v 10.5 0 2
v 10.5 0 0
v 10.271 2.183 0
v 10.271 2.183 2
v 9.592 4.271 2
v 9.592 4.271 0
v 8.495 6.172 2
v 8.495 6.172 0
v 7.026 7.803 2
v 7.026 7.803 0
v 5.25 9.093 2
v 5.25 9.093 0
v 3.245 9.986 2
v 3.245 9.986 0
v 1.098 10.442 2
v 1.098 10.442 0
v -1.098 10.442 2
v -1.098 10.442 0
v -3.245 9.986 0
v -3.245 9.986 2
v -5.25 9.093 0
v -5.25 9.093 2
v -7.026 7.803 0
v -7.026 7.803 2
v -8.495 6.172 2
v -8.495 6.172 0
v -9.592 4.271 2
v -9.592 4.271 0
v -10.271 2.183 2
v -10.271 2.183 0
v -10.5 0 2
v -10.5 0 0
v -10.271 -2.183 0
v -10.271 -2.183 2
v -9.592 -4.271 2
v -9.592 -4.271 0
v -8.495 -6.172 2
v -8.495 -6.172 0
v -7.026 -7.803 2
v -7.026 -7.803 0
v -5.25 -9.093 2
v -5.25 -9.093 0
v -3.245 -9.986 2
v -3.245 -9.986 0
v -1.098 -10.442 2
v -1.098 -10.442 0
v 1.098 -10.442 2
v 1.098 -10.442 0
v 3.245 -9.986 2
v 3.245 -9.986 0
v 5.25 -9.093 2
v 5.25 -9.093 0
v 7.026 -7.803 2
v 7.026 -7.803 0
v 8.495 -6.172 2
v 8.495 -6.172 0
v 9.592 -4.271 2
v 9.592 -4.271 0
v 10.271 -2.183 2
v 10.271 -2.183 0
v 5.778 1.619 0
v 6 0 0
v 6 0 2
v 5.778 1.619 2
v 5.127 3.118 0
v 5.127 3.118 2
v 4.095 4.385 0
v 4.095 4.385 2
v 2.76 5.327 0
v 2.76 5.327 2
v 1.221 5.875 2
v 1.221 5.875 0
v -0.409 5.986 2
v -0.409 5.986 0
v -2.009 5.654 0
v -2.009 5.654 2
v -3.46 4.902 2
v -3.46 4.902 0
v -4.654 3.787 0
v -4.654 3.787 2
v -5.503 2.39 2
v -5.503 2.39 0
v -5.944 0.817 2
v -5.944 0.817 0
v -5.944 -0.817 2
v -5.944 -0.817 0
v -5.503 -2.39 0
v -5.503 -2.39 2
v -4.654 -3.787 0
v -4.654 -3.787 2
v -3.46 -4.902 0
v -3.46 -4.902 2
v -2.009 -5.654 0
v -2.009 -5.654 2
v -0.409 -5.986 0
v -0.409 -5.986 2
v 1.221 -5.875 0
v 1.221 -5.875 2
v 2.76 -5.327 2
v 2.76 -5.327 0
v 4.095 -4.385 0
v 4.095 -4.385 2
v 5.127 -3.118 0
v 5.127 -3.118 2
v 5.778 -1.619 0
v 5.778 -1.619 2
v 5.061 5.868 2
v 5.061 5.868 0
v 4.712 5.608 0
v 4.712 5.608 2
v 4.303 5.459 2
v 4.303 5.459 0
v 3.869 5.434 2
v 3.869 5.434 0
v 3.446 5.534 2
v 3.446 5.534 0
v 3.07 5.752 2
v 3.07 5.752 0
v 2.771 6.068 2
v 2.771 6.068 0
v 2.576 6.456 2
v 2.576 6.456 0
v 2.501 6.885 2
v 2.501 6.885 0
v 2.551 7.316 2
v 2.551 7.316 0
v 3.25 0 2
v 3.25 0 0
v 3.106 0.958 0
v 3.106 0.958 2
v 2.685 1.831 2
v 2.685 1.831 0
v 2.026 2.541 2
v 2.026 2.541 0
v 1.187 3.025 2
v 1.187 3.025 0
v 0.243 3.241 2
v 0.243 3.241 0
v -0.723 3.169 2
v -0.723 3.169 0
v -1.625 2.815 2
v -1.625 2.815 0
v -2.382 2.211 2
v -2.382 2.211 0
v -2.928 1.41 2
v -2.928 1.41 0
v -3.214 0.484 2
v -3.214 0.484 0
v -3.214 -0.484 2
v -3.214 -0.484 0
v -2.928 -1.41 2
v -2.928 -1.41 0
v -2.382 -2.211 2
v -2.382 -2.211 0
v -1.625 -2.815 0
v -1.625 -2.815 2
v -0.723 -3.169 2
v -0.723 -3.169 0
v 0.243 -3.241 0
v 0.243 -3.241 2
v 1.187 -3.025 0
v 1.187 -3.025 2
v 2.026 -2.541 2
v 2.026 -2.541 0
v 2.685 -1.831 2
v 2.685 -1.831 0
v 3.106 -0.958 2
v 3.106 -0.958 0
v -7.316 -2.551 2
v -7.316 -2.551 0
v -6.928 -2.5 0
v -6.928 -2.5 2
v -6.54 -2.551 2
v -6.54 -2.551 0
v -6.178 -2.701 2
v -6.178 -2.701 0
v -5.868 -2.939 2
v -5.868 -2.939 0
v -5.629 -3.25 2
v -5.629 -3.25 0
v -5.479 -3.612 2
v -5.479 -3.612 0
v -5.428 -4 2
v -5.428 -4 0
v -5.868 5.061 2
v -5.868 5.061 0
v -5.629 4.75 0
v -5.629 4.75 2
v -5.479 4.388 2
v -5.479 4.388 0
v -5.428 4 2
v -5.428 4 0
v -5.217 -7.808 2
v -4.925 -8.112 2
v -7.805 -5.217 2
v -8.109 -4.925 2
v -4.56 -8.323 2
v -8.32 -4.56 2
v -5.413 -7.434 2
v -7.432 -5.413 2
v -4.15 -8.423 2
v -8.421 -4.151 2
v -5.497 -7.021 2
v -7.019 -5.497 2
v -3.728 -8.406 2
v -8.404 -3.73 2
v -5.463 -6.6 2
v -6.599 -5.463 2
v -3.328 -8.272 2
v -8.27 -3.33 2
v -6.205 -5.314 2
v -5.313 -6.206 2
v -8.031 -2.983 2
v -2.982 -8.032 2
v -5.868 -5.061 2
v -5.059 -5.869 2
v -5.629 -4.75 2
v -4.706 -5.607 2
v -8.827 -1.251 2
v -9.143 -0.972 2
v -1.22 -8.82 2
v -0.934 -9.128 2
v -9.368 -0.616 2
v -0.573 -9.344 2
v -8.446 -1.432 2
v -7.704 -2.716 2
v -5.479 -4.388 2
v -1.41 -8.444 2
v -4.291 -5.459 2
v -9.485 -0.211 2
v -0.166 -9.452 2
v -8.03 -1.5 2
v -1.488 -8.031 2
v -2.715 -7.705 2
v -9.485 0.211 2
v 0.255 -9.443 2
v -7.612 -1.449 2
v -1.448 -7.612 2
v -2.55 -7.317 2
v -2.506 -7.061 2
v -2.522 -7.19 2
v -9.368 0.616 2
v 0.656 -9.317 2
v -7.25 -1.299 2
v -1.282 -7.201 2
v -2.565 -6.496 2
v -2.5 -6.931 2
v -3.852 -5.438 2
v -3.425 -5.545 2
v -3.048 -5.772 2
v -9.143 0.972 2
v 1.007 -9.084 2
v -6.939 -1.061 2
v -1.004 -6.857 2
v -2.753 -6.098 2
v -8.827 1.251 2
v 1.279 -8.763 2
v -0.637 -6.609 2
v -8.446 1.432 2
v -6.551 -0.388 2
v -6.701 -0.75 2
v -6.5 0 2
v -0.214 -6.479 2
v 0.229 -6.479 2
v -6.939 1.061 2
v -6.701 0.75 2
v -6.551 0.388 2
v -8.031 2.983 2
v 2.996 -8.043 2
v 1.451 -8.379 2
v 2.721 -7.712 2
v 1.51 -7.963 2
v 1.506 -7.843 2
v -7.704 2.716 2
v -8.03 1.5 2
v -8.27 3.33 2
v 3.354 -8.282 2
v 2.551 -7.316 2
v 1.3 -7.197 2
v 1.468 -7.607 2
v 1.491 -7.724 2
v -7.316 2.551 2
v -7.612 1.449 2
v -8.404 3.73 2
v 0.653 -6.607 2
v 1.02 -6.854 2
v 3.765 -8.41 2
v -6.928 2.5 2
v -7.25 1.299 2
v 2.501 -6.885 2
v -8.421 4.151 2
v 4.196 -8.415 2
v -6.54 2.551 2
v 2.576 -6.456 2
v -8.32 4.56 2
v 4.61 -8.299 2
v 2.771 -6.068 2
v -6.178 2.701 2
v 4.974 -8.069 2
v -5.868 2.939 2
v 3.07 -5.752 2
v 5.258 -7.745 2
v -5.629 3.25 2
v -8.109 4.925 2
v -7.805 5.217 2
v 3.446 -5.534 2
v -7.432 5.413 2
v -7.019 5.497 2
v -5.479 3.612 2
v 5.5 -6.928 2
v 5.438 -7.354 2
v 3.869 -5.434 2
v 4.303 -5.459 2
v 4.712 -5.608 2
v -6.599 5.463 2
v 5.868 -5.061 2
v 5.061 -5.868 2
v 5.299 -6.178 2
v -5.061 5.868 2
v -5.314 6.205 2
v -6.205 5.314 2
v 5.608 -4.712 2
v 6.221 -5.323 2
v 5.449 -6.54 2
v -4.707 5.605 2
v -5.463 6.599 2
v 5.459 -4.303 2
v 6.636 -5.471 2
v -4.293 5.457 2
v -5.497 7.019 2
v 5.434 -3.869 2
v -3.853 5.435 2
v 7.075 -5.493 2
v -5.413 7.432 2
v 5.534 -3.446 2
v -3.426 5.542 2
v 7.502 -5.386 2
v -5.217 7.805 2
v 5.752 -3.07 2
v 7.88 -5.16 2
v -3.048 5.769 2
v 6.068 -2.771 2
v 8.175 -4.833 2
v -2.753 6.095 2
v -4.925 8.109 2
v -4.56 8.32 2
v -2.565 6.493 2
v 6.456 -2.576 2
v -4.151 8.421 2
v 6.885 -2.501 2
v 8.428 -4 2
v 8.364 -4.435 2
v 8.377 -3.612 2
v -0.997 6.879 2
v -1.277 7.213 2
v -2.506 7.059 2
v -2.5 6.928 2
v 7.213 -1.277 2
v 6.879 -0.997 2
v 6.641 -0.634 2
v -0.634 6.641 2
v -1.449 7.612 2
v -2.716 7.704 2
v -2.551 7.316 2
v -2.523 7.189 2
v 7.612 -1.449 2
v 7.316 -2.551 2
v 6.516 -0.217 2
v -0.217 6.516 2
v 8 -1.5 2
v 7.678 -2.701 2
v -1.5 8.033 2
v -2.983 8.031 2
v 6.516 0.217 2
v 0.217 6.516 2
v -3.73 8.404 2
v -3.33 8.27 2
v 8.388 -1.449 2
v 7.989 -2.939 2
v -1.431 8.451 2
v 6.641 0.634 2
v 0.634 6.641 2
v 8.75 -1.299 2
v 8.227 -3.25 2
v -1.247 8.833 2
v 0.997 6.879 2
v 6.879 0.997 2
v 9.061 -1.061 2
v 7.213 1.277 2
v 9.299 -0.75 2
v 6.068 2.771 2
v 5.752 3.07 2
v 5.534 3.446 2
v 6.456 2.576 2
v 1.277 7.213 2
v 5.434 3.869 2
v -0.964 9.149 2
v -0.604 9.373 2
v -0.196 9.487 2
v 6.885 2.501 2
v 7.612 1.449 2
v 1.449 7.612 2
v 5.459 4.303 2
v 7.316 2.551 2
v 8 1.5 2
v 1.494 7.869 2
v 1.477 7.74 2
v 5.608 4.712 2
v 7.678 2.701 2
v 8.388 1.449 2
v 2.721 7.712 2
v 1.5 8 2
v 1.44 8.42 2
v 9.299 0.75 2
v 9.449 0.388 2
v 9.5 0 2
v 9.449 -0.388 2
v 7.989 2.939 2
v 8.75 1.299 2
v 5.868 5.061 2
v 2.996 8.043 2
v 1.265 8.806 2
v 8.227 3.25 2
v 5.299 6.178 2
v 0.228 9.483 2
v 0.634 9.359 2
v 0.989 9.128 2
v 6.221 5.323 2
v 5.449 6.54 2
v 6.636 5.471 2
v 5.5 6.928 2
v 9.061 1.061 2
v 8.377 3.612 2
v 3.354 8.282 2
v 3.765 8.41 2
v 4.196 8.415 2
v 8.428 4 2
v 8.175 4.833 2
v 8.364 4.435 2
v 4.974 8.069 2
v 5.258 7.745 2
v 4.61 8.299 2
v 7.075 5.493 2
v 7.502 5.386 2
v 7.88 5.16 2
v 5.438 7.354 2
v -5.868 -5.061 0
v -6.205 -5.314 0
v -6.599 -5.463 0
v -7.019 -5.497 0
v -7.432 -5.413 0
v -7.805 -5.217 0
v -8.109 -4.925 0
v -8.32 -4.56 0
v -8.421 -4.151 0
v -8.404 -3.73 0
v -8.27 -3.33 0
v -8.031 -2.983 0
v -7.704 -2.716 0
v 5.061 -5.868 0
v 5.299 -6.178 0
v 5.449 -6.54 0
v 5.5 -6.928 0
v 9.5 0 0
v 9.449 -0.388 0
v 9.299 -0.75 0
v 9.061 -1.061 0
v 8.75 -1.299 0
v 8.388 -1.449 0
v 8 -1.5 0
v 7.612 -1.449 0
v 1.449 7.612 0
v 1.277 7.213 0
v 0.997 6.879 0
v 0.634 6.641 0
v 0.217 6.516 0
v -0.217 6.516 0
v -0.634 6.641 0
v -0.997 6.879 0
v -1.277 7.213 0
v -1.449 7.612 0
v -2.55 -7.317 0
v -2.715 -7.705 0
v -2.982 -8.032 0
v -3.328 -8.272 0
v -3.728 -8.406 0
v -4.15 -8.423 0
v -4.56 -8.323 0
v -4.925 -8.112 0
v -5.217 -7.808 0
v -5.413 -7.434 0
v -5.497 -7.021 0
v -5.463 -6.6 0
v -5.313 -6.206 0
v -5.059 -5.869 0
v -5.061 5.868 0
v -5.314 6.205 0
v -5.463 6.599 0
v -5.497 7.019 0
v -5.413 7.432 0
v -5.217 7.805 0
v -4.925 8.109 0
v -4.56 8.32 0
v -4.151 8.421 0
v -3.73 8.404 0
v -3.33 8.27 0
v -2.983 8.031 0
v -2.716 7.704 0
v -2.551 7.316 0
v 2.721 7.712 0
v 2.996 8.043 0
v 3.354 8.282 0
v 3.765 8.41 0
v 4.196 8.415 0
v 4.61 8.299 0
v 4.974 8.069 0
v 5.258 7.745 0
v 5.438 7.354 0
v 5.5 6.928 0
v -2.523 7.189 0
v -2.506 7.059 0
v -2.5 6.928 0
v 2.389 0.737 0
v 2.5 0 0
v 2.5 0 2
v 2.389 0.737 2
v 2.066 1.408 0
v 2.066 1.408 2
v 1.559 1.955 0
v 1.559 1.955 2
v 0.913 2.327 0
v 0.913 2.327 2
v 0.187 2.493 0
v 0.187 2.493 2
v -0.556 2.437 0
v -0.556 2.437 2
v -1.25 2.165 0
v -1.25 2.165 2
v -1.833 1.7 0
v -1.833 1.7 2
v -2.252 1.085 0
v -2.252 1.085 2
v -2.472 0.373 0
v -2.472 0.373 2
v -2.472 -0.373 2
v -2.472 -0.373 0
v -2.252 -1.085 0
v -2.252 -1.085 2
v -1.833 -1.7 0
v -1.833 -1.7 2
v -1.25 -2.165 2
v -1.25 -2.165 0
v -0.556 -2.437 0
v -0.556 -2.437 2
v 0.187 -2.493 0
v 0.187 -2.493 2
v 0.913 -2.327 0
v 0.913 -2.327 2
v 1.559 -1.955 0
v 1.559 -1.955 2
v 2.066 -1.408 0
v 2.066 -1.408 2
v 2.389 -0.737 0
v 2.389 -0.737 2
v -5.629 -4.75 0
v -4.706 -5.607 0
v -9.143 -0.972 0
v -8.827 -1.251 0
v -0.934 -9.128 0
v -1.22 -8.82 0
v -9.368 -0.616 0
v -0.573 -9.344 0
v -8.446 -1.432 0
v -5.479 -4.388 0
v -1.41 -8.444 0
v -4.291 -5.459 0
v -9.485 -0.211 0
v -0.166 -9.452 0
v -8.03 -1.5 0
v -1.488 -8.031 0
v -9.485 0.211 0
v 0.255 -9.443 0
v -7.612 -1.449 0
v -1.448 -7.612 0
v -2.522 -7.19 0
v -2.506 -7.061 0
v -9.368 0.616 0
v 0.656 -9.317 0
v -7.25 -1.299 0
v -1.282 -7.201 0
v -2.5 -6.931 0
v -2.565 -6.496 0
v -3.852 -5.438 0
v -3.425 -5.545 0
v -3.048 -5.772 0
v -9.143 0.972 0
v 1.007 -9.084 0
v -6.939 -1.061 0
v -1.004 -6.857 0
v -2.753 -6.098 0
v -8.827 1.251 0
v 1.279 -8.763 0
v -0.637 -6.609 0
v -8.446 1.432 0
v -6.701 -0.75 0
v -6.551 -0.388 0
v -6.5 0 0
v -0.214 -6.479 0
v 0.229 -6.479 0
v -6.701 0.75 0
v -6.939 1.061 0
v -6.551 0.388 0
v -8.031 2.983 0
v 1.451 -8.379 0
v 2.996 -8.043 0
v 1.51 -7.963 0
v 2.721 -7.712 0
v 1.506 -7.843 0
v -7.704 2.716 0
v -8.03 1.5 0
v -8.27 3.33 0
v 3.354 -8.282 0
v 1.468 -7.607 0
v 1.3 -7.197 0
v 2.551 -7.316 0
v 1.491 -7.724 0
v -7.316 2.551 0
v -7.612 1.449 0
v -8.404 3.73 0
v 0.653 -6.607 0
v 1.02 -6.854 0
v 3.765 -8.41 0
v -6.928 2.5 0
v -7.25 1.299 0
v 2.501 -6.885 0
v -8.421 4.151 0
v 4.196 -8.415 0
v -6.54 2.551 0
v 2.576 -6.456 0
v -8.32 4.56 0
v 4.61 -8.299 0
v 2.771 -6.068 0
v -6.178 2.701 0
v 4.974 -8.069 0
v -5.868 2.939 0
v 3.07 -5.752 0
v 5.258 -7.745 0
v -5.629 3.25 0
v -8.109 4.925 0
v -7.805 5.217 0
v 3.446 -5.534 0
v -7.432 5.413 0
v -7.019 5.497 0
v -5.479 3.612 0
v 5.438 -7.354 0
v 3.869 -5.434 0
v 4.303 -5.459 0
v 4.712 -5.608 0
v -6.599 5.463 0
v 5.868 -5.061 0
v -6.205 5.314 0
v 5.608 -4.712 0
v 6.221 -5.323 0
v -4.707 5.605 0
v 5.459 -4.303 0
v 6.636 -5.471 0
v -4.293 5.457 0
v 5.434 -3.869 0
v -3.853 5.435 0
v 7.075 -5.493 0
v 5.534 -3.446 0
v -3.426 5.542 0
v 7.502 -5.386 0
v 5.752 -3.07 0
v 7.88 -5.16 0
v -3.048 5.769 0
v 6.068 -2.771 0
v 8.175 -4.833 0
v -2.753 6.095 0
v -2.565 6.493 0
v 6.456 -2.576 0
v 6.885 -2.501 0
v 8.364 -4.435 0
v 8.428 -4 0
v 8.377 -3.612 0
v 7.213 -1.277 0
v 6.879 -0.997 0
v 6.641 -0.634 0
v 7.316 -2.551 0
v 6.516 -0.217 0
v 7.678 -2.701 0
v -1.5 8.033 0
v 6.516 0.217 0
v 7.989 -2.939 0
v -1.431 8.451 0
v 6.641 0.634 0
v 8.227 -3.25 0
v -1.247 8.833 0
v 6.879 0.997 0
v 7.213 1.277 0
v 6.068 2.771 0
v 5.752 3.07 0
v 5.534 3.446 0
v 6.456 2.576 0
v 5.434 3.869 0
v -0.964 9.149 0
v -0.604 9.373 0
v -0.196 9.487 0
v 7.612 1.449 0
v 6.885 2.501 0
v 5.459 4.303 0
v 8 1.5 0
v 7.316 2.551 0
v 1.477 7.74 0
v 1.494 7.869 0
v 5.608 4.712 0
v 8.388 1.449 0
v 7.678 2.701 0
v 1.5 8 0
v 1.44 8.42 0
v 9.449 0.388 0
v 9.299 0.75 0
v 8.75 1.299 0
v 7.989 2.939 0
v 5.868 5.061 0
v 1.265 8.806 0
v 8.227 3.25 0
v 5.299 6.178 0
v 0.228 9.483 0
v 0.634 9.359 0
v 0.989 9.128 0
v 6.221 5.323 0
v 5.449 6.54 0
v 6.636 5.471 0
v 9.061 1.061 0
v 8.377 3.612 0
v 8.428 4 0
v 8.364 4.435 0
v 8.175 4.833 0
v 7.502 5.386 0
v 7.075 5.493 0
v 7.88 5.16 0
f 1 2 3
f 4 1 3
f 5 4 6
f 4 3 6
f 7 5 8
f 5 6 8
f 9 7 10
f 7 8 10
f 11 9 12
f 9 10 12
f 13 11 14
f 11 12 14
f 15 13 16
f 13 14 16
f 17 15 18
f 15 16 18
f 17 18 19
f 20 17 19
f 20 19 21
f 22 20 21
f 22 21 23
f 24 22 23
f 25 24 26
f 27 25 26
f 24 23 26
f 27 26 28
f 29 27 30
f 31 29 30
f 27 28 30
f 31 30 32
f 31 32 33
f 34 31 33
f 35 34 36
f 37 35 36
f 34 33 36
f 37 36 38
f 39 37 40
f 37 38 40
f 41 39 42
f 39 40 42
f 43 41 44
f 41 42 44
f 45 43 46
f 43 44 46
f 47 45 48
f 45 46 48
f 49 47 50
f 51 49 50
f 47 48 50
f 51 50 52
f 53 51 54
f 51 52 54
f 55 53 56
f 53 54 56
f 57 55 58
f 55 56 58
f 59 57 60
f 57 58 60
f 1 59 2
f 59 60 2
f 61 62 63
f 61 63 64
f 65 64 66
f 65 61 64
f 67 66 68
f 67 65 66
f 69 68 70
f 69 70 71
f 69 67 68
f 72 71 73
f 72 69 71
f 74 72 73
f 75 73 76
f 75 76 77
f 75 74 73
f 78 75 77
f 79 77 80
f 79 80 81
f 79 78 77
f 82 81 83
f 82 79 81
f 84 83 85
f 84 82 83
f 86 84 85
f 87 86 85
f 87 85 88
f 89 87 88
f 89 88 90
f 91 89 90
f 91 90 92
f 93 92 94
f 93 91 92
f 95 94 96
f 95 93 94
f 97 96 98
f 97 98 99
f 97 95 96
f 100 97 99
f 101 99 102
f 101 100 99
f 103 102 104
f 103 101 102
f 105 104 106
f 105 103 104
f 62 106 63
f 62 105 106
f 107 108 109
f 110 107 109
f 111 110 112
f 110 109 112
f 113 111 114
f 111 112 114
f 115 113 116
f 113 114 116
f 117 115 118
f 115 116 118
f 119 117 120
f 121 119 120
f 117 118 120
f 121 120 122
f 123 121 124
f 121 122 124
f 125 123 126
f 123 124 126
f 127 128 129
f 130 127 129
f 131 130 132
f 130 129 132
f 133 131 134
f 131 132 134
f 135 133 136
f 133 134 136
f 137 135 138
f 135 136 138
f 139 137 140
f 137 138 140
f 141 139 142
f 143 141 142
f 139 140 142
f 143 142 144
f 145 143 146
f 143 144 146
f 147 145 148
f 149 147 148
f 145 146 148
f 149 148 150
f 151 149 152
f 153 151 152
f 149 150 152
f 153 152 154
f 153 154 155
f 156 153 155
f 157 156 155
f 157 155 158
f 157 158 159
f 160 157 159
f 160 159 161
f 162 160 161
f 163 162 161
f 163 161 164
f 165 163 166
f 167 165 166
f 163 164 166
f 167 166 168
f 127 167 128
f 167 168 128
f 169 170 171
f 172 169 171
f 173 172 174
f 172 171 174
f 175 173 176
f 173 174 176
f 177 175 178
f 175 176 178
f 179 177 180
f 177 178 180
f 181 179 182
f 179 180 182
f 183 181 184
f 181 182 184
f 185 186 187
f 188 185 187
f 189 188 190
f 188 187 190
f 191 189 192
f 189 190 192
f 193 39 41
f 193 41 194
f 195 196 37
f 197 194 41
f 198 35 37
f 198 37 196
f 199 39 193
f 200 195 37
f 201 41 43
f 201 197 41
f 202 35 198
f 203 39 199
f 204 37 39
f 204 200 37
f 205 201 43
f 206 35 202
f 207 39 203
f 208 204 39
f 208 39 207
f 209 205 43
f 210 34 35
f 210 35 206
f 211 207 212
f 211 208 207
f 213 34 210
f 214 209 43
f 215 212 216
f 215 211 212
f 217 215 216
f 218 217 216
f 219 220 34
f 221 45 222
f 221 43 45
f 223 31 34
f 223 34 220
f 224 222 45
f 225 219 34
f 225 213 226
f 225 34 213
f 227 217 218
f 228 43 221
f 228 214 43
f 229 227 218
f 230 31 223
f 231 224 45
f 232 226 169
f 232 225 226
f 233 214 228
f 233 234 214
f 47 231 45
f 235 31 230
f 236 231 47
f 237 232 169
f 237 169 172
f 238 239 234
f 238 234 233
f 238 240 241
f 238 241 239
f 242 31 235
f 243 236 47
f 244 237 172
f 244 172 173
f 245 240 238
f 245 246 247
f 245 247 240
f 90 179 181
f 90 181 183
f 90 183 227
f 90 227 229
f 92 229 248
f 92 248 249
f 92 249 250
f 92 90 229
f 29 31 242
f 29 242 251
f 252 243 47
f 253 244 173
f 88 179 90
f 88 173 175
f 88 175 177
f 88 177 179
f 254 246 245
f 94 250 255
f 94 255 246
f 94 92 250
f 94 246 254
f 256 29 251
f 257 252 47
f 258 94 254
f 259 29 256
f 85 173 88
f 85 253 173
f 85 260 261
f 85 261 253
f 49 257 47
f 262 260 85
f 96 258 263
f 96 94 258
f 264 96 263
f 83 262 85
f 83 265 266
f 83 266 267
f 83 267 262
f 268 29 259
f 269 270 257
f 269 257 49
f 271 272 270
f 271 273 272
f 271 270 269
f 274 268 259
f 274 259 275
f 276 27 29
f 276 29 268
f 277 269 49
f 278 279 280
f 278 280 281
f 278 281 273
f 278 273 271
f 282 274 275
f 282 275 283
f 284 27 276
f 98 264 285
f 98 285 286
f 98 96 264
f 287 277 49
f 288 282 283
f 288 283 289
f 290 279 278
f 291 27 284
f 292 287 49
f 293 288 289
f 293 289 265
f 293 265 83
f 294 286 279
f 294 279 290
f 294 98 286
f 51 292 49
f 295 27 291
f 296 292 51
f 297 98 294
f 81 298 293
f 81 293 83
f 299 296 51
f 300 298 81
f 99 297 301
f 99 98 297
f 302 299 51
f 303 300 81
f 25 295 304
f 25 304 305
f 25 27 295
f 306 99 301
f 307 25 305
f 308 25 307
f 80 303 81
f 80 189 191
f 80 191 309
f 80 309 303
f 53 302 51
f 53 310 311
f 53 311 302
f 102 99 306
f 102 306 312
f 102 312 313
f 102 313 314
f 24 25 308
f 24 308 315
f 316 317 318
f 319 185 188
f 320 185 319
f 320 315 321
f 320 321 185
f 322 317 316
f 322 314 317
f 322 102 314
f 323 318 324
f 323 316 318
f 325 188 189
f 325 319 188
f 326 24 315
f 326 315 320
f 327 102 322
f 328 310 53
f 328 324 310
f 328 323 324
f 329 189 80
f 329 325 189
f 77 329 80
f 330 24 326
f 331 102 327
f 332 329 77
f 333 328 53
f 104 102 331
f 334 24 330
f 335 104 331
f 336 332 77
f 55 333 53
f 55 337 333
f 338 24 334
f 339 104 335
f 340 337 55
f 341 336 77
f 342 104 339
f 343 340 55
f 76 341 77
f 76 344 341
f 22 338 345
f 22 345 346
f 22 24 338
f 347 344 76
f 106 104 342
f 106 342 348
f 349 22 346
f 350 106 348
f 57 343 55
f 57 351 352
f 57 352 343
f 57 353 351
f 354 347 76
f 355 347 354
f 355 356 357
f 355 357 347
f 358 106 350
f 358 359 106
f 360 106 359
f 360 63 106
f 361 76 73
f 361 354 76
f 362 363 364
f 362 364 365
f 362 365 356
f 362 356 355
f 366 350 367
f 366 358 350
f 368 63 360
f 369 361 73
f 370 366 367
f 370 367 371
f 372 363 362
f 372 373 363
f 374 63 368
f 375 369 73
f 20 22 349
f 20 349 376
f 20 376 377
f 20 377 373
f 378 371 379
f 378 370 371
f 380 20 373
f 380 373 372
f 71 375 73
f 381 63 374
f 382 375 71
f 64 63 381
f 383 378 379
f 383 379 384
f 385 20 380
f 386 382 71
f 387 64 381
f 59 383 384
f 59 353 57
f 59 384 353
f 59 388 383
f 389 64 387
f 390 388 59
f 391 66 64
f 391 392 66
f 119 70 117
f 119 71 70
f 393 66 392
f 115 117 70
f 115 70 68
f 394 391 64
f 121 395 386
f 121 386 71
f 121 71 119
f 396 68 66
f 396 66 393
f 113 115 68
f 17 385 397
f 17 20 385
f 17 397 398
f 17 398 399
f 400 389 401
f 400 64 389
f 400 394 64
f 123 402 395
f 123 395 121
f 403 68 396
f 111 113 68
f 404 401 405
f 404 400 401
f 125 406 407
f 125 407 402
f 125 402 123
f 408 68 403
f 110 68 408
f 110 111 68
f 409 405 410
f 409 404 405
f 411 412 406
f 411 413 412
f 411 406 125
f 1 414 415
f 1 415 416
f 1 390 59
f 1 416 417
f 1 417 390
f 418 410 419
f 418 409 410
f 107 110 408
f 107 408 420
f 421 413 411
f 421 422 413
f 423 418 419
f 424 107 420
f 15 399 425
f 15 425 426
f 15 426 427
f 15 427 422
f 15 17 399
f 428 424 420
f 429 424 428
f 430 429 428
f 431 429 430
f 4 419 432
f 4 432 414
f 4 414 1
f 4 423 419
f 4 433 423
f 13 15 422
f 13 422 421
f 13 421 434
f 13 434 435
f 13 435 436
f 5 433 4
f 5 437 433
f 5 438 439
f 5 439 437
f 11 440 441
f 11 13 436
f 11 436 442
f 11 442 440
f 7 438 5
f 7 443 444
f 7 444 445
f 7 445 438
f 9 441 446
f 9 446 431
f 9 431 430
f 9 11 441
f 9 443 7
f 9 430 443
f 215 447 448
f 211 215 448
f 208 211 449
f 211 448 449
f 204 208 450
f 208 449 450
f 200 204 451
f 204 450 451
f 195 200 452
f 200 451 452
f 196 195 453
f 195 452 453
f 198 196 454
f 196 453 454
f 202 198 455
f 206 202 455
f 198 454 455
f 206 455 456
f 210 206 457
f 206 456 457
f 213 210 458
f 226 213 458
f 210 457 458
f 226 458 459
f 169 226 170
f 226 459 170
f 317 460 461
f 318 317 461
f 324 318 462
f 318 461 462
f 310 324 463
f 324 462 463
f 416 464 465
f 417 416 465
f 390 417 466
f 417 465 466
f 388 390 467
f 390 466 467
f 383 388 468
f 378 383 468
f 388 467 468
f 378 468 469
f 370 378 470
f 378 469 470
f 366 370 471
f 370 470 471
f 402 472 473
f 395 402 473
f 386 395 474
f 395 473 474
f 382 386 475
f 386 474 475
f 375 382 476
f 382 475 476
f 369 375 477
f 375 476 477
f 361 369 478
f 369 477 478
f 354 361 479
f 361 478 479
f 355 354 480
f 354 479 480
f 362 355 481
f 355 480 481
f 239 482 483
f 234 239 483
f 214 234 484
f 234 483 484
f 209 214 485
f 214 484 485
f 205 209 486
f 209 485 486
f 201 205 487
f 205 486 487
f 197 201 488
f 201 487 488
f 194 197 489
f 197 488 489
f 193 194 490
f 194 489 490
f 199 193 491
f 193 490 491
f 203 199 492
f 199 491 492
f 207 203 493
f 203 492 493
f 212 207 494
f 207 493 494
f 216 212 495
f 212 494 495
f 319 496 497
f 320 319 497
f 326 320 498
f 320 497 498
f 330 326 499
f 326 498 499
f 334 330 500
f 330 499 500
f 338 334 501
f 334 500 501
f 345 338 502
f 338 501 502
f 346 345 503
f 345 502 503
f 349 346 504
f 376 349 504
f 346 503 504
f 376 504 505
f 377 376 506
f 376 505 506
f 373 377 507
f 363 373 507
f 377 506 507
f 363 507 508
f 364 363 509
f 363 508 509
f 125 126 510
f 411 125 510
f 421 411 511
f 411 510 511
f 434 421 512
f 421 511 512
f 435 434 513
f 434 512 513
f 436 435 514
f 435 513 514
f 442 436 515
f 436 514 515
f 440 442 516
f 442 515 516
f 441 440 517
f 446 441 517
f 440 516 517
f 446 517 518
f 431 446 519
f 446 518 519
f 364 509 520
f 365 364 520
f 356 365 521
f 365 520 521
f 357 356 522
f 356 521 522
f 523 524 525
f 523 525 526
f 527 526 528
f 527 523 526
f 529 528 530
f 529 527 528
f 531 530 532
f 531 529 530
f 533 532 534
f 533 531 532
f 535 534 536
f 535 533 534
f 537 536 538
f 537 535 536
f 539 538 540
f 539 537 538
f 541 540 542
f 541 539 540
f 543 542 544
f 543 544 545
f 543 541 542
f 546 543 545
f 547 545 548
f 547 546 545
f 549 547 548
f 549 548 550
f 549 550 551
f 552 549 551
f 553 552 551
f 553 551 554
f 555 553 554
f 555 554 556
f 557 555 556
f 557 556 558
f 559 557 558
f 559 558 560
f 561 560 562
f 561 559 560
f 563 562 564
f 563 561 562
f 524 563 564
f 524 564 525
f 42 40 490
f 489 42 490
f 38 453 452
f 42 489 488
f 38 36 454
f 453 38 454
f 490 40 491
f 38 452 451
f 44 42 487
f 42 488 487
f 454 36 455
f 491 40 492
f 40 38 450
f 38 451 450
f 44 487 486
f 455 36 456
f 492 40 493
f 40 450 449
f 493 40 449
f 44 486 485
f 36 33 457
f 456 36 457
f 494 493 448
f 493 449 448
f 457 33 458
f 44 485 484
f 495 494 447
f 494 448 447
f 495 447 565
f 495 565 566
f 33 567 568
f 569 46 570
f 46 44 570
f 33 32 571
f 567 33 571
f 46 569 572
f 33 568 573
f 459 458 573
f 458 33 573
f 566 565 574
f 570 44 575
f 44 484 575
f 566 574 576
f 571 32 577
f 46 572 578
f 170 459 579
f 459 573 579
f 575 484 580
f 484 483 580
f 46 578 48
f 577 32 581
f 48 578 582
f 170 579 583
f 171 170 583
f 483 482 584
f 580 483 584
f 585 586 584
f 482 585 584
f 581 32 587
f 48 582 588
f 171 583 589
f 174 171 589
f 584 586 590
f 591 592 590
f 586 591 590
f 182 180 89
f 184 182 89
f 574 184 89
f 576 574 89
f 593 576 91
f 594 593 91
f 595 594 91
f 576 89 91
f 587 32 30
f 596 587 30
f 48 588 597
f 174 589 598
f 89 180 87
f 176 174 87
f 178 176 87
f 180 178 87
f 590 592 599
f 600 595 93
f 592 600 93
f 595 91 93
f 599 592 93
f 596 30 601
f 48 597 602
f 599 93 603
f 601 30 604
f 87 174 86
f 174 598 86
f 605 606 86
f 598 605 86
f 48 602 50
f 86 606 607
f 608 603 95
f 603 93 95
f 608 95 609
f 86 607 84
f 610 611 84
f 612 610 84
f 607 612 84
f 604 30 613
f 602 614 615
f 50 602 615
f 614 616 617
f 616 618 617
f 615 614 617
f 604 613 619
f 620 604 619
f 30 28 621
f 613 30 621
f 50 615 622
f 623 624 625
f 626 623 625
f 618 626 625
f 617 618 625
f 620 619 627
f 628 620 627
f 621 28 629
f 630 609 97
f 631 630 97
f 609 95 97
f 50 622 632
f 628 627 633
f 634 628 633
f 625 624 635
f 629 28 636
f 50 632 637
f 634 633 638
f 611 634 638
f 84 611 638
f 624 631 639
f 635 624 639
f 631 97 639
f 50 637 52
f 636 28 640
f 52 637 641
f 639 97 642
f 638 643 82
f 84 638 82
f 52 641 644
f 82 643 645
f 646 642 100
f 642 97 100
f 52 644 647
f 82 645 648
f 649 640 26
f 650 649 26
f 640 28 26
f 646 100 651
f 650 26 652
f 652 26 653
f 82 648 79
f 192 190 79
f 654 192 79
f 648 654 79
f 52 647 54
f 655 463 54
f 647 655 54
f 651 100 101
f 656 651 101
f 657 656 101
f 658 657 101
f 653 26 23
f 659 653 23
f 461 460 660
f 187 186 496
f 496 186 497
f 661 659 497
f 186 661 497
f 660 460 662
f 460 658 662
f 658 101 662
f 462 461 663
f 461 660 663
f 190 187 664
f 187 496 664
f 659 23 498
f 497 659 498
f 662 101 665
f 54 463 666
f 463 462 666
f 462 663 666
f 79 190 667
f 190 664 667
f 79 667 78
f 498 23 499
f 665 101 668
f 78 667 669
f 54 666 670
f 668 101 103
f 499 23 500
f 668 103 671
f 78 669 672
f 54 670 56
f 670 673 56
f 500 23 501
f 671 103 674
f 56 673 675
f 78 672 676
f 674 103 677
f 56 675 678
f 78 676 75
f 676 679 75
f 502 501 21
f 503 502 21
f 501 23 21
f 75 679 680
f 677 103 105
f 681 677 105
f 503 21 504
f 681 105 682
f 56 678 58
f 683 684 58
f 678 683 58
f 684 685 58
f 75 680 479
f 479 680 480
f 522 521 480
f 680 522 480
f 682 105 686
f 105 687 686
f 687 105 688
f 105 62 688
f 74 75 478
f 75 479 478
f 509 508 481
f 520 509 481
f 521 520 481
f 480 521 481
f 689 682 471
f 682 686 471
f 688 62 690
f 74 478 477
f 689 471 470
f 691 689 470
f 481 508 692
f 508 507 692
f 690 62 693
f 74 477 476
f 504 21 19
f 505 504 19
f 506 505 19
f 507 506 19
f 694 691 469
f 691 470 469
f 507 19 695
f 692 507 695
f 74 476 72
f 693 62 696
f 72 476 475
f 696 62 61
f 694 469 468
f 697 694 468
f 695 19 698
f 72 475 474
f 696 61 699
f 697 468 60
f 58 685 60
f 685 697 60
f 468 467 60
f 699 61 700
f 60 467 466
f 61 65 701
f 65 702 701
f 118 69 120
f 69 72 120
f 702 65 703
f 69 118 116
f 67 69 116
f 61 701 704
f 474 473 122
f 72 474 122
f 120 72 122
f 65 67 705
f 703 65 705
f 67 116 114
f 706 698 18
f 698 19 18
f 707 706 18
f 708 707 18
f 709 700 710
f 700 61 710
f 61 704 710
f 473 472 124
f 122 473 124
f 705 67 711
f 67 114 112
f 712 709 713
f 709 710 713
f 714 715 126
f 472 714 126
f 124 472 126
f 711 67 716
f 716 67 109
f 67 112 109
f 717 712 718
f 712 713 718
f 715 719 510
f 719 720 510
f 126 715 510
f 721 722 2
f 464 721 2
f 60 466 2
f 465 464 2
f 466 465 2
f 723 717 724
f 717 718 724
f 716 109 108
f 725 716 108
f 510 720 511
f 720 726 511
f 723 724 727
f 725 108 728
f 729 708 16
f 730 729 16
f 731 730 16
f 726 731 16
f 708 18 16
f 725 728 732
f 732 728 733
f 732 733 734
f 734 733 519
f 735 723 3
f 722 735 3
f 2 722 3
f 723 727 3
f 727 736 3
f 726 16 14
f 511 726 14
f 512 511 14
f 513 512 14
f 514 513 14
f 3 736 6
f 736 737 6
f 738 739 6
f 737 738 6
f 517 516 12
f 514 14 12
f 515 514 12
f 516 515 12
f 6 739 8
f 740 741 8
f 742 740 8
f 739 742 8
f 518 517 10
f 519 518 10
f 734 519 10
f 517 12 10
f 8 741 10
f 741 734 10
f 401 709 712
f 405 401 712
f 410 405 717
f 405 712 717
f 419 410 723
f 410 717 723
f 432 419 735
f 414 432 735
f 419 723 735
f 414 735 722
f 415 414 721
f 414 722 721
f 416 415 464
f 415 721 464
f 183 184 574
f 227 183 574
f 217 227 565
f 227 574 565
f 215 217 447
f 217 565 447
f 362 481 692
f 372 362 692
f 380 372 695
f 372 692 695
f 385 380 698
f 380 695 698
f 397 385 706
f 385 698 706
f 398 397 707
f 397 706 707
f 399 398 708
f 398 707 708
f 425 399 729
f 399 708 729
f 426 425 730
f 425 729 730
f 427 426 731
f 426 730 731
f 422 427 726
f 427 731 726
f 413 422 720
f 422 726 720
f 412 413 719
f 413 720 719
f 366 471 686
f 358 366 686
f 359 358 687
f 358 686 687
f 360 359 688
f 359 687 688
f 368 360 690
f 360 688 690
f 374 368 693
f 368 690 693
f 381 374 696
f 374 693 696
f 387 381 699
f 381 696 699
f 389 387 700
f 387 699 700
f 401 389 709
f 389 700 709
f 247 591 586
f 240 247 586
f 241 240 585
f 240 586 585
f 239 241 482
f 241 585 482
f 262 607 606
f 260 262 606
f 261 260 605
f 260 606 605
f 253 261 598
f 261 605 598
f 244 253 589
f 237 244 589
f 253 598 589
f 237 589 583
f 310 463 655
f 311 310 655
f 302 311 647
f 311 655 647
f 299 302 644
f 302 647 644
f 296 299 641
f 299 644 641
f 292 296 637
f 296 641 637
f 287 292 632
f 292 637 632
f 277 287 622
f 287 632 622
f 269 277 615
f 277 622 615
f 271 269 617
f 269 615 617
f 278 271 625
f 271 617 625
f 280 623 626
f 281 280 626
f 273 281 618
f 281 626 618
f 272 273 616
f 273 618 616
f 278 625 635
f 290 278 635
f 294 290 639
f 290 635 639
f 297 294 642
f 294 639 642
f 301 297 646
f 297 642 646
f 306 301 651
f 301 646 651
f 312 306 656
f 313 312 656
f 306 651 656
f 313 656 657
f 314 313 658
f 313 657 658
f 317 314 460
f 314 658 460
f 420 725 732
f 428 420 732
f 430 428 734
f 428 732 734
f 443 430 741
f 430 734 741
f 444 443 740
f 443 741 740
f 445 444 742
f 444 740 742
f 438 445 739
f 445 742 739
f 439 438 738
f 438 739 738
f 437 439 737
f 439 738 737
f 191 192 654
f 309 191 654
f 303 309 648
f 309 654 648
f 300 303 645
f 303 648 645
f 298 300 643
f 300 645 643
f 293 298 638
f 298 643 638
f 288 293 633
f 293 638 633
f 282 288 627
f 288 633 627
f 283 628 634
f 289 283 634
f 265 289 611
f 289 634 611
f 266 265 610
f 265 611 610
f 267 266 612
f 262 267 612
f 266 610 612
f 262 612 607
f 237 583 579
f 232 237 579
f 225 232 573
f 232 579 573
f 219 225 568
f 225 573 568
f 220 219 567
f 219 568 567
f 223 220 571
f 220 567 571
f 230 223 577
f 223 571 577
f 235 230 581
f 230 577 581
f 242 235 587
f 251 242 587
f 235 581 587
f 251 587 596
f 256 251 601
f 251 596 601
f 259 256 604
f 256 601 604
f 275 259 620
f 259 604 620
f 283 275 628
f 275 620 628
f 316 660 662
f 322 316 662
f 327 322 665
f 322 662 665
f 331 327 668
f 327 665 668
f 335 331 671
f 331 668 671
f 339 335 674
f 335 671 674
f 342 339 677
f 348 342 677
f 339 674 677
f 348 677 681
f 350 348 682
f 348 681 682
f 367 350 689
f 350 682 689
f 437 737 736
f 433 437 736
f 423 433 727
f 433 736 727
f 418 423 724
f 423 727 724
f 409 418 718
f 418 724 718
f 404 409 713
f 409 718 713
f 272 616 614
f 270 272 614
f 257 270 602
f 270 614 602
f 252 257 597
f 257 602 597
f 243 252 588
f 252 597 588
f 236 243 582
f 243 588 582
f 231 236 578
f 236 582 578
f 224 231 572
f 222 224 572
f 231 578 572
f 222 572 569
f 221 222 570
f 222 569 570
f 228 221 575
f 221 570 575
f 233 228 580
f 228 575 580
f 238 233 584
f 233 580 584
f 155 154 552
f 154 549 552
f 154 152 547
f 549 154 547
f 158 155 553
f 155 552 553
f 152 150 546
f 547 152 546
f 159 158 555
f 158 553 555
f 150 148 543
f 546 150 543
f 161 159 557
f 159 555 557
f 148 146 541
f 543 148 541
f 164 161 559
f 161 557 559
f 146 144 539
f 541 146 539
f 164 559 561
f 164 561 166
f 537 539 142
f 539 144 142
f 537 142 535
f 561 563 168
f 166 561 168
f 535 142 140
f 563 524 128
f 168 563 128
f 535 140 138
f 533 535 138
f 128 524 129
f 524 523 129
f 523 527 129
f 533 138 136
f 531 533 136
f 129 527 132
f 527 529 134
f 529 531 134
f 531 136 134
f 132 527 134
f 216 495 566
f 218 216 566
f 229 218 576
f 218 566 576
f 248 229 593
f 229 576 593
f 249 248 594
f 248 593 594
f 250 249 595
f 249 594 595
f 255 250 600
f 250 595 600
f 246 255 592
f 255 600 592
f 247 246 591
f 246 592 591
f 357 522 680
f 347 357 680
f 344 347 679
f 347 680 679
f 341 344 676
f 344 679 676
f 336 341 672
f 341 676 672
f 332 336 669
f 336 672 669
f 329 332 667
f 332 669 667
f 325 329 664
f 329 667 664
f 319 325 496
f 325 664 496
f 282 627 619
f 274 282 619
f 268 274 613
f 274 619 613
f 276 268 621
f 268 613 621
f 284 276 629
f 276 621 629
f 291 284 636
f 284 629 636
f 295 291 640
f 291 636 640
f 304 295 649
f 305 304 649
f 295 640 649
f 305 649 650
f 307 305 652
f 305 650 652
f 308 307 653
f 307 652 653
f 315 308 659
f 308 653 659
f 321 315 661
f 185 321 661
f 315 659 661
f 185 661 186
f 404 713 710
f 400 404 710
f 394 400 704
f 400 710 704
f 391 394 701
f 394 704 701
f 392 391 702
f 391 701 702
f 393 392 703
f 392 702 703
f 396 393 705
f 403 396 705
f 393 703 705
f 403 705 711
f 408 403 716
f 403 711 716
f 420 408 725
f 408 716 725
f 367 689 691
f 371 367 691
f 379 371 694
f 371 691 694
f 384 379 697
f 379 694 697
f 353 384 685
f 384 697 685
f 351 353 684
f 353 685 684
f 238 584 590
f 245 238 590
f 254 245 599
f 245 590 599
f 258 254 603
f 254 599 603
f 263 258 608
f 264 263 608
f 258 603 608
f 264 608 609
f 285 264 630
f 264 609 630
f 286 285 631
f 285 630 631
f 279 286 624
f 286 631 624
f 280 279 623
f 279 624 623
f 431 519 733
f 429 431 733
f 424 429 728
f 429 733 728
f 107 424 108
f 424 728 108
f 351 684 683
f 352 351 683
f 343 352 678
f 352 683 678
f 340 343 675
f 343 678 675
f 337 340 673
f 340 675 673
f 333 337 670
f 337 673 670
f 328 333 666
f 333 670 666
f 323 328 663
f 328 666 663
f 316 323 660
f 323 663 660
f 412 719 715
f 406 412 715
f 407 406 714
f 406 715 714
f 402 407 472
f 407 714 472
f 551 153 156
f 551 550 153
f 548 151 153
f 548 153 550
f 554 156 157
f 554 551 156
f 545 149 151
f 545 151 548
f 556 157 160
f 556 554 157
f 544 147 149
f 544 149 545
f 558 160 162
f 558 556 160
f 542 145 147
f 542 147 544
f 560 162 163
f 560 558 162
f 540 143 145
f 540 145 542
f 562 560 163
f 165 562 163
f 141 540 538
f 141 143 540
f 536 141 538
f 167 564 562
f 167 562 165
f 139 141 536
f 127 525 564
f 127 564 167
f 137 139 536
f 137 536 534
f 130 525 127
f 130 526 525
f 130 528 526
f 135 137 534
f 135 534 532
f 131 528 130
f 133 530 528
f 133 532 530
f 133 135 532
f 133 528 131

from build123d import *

# Parameters (mm, degrees)
F0_R     = 10.5
F0_R_2   = 6
F1_DEPTH = 2
F0_R_3   = 3.25
F0_R_4   = 2.5


# Not quite as in the source:
# - the program builds the solid bodies; features that only make, move or delete a surface that nothing else refers to are left out


with BuildPart() as f1:
    # F0 (on Top) → F1 (new body)
    with BuildSketch(Plane.XY):
        Circle(F0_R)
        with BuildLine():
            ThreePointArc((-5.0606601718, 5.8675430585), (-4.75, 8.227241336), (-2.5511112606, 7.3164317979))
            Line((-2.5511112606, 7.3164317979), (-1.4488887394, 7.6117714323))
            ThreePointArc((-1.4488887394, 7.6117714323), (-0.1957892883, 9.4871672921), (1.5, 8))
            ThreePointArc((1.5, 8), (1.4871672921, 7.8042107117), (1.4488887394, 7.6117714323))
            Line((1.4488887394, 7.6117714323), (2.5511112606, 7.3164317979))
            ThreePointArc((2.5511112606, 7.3164317979), (4.1957892883, 8.4153705223), (5.5, 6.9282032303))
            ThreePointArc((5.5, 6.9282032303), (5.3858192988, 6.3541780817), (5.0606601718, 5.8675430585))
            Line((5.0606601718, 5.8675430585), (5.8675430585, 5.0606601718))
            ThreePointArc((5.8675430585, 5.0606601718), (7.5022283788, 5.3858192988), (8.4282032303, 4))
            ThreePointArc((8.4282032303, 4), (8.1182332407, 3.0868578565), (7.3164317979, 2.5511112606))
            Line((7.3164317979, 2.5511112606), (7.6117714323, 1.4488887394))
            ThreePointArc((7.6117714323, 1.4488887394), (8.9131421435, 1.1900300104), (9.5, 0))
            ThreePointArc((9.5, 0), (8.9131421435, -1.1900300104), (7.6117714323, -1.4488887394))
            Line((7.6117714323, -1.4488887394), (7.3164317979, -2.5511112606))
            ThreePointArc((7.3164317979, -2.5511112606), (8.1182332407, -3.0868578565), (8.4282032303, -4))
            ThreePointArc((8.4282032303, -4), (7.5022283788, -5.3858192988), (5.8675430585, -5.0606601718))
            Line((5.8675430585, -5.0606601718), (5.0606601718, -5.8675430585))
            ThreePointArc((5.0606601718, -5.8675430585), (5.3858192988, -6.3541780817), (5.5, -6.9282032303))
            ThreePointArc((5.5, -6.9282032303), (4.1957892883, -8.4153705223), (2.5511112606, -7.3164317979))
            Line((2.5511112606, -7.3164317979), (1.4675350544, -7.6067751673))
            ThreePointArc((1.4675350544, -7.6067751673), (1.4996006084, -7.7833853166), (1.51034039, -7.9625612125))
            ThreePointArc((1.51034039, -7.9625612125), (-0.16617732, -9.4521388365), (-1.4481149408, -7.6119787711))
            Line((-1.4481149408, -7.6119787711), (-2.5504401106, -7.316611632))
            ThreePointArc((-2.5504401106, -7.316611632), (-4.7496981342, -8.2301088879), (-5.0593126587, -5.8688905716))
            Line((-5.0593126587, -5.8688905716), (-5.8675430585, -5.0606601718))
            ThreePointArc((-5.8675430585, -5.0606601718), (-8.227241336, -4.75), (-7.3164317979, -2.5511112606))
            Line((-7.3164317979, -2.5511112606), (-7.6117714323, -1.4488887394))
            ThreePointArc((-7.6117714323, -1.4488887394), (-9.5, 0), (-7.6117714323, 1.4488887394))
            Line((-7.6117714323, 1.4488887394), (-7.3164317979, 2.5511112606))
            ThreePointArc((-7.3164317979, 2.5511112606), (-8.227241336, 4.75), (-5.8675430585, 5.0606601718))
            Line((-5.8675430585, 5.0606601718), (-5.0606601718, 5.8675430585))
        make_face(mode=Mode.SUBTRACT)
        with BuildLine():
            ThreePointArc((-2.5511112606, 7.3164317979), (-2.5128327079, 7.1239925186), (-2.5, 6.9282032303))
            ThreePointArc((-2.5, 6.9282032303), (-3.4259748515, 5.5423839315), (-5.0606601718, 5.8675430585))
            Line((-5.0606601718, 5.8675430585), (-5.8675430585, 5.0606601718))
            ThreePointArc((-5.8675430585, 5.0606601718), (-5.5423839315, 4.5740251485), (-5.4282032303, 4))
            ThreePointArc((-5.4282032303, 4), (-6.0150610868, 2.8099699896), (-7.3164317979, 2.5511112606))
            Line((-7.3164317979, 2.5511112606), (-7.6117714323, 1.4488887394))
            ThreePointArc((-7.6117714323, 1.4488887394), (-6.8099699896, 0.9131421435), (-6.5, 0))
            ThreePointArc((-6.5, 0), (-6.8099699896, -0.9131421435), (-7.6117714323, -1.4488887394))
            Line((-7.6117714323, -1.4488887394), (-7.3164317979, -2.5511112606))
            ThreePointArc((-7.3164317979, -2.5511112606), (-6.0150610868, -2.8099699896), (-5.4282032303, -4))
            ThreePointArc((-5.4282032303, -4), (-5.5423839315, -4.5740251485), (-5.8675430585, -5.0606601718))
            Line((-5.8675430585, -5.0606601718), (-5.0593126587, -5.8688905716))
            ThreePointArc((-5.0593126587, -5.8688905716), (-3.4250952201, -5.5454419303), (-2.5, -6.9308965467))
            ThreePointArc((-2.5, -6.9308965467), (-2.5126634822, -7.1253961173), (-2.5504401106, -7.316611632))
            Line((-2.5504401106, -7.316611632), (-1.4481149408, -7.6119787711))
            ThreePointArc((-1.4481149408, -7.6119787711), (0.007663322, -6.4625636014), (1.4675350544, -7.6067751673))
            Line((1.4675350544, -7.6067751673), (2.5511112606, -7.3164317979))
            ThreePointArc((2.5511112606, -7.3164317979), (3.25, -5.6291651246), (5.0606601718, -5.8675430585))
            Line((5.0606601718, -5.8675430585), (5.8675430585, -5.0606601718))
            ThreePointArc((5.8675430585, -5.0606601718), (5.6291651246, -3.25), (7.3164317979, -2.5511112606))
            Line((7.3164317979, -2.5511112606), (7.6117714323, -1.4488887394))
            ThreePointArc((7.6117714323, -1.4488887394), (6.5, 0), (7.6117714323, 1.4488887394))
            Line((7.6117714323, 1.4488887394), (7.3164317979, 2.5511112606))
            ThreePointArc((7.3164317979, 2.5511112606), (5.6291651246, 3.25), (5.8675430585, 5.0606601718))
            Line((5.8675430585, 5.0606601718), (5.0606601718, 5.8675430585))
            ThreePointArc((5.0606601718, 5.8675430585), (3.25, 5.6291651246), (2.5511112606, 7.3164317979))
            Line((2.5511112606, 7.3164317979), (1.4488887394, 7.6117714323))
            ThreePointArc((1.4488887394, 7.6117714323), (0, 6.5), (-1.4488887394, 7.6117714323))
            Line((-1.4488887394, 7.6117714323), (-2.5511112606, 7.3164317979))
        make_face()
        Circle(F0_R_2, mode=Mode.SUBTRACT)
    extrude(amount=F1_DEPTH)


with BuildPart() as f1b:
    # F0 (on Top) → F1, piece 2 (new body)
    with BuildSketch(Plane.XY):
        Circle(F0_R_3)
        Circle(F0_R_4, mode=Mode.SUBTRACT)
    extrude(amount=F1_DEPTH)


solid = Compound([f1.part, f1b.part])
